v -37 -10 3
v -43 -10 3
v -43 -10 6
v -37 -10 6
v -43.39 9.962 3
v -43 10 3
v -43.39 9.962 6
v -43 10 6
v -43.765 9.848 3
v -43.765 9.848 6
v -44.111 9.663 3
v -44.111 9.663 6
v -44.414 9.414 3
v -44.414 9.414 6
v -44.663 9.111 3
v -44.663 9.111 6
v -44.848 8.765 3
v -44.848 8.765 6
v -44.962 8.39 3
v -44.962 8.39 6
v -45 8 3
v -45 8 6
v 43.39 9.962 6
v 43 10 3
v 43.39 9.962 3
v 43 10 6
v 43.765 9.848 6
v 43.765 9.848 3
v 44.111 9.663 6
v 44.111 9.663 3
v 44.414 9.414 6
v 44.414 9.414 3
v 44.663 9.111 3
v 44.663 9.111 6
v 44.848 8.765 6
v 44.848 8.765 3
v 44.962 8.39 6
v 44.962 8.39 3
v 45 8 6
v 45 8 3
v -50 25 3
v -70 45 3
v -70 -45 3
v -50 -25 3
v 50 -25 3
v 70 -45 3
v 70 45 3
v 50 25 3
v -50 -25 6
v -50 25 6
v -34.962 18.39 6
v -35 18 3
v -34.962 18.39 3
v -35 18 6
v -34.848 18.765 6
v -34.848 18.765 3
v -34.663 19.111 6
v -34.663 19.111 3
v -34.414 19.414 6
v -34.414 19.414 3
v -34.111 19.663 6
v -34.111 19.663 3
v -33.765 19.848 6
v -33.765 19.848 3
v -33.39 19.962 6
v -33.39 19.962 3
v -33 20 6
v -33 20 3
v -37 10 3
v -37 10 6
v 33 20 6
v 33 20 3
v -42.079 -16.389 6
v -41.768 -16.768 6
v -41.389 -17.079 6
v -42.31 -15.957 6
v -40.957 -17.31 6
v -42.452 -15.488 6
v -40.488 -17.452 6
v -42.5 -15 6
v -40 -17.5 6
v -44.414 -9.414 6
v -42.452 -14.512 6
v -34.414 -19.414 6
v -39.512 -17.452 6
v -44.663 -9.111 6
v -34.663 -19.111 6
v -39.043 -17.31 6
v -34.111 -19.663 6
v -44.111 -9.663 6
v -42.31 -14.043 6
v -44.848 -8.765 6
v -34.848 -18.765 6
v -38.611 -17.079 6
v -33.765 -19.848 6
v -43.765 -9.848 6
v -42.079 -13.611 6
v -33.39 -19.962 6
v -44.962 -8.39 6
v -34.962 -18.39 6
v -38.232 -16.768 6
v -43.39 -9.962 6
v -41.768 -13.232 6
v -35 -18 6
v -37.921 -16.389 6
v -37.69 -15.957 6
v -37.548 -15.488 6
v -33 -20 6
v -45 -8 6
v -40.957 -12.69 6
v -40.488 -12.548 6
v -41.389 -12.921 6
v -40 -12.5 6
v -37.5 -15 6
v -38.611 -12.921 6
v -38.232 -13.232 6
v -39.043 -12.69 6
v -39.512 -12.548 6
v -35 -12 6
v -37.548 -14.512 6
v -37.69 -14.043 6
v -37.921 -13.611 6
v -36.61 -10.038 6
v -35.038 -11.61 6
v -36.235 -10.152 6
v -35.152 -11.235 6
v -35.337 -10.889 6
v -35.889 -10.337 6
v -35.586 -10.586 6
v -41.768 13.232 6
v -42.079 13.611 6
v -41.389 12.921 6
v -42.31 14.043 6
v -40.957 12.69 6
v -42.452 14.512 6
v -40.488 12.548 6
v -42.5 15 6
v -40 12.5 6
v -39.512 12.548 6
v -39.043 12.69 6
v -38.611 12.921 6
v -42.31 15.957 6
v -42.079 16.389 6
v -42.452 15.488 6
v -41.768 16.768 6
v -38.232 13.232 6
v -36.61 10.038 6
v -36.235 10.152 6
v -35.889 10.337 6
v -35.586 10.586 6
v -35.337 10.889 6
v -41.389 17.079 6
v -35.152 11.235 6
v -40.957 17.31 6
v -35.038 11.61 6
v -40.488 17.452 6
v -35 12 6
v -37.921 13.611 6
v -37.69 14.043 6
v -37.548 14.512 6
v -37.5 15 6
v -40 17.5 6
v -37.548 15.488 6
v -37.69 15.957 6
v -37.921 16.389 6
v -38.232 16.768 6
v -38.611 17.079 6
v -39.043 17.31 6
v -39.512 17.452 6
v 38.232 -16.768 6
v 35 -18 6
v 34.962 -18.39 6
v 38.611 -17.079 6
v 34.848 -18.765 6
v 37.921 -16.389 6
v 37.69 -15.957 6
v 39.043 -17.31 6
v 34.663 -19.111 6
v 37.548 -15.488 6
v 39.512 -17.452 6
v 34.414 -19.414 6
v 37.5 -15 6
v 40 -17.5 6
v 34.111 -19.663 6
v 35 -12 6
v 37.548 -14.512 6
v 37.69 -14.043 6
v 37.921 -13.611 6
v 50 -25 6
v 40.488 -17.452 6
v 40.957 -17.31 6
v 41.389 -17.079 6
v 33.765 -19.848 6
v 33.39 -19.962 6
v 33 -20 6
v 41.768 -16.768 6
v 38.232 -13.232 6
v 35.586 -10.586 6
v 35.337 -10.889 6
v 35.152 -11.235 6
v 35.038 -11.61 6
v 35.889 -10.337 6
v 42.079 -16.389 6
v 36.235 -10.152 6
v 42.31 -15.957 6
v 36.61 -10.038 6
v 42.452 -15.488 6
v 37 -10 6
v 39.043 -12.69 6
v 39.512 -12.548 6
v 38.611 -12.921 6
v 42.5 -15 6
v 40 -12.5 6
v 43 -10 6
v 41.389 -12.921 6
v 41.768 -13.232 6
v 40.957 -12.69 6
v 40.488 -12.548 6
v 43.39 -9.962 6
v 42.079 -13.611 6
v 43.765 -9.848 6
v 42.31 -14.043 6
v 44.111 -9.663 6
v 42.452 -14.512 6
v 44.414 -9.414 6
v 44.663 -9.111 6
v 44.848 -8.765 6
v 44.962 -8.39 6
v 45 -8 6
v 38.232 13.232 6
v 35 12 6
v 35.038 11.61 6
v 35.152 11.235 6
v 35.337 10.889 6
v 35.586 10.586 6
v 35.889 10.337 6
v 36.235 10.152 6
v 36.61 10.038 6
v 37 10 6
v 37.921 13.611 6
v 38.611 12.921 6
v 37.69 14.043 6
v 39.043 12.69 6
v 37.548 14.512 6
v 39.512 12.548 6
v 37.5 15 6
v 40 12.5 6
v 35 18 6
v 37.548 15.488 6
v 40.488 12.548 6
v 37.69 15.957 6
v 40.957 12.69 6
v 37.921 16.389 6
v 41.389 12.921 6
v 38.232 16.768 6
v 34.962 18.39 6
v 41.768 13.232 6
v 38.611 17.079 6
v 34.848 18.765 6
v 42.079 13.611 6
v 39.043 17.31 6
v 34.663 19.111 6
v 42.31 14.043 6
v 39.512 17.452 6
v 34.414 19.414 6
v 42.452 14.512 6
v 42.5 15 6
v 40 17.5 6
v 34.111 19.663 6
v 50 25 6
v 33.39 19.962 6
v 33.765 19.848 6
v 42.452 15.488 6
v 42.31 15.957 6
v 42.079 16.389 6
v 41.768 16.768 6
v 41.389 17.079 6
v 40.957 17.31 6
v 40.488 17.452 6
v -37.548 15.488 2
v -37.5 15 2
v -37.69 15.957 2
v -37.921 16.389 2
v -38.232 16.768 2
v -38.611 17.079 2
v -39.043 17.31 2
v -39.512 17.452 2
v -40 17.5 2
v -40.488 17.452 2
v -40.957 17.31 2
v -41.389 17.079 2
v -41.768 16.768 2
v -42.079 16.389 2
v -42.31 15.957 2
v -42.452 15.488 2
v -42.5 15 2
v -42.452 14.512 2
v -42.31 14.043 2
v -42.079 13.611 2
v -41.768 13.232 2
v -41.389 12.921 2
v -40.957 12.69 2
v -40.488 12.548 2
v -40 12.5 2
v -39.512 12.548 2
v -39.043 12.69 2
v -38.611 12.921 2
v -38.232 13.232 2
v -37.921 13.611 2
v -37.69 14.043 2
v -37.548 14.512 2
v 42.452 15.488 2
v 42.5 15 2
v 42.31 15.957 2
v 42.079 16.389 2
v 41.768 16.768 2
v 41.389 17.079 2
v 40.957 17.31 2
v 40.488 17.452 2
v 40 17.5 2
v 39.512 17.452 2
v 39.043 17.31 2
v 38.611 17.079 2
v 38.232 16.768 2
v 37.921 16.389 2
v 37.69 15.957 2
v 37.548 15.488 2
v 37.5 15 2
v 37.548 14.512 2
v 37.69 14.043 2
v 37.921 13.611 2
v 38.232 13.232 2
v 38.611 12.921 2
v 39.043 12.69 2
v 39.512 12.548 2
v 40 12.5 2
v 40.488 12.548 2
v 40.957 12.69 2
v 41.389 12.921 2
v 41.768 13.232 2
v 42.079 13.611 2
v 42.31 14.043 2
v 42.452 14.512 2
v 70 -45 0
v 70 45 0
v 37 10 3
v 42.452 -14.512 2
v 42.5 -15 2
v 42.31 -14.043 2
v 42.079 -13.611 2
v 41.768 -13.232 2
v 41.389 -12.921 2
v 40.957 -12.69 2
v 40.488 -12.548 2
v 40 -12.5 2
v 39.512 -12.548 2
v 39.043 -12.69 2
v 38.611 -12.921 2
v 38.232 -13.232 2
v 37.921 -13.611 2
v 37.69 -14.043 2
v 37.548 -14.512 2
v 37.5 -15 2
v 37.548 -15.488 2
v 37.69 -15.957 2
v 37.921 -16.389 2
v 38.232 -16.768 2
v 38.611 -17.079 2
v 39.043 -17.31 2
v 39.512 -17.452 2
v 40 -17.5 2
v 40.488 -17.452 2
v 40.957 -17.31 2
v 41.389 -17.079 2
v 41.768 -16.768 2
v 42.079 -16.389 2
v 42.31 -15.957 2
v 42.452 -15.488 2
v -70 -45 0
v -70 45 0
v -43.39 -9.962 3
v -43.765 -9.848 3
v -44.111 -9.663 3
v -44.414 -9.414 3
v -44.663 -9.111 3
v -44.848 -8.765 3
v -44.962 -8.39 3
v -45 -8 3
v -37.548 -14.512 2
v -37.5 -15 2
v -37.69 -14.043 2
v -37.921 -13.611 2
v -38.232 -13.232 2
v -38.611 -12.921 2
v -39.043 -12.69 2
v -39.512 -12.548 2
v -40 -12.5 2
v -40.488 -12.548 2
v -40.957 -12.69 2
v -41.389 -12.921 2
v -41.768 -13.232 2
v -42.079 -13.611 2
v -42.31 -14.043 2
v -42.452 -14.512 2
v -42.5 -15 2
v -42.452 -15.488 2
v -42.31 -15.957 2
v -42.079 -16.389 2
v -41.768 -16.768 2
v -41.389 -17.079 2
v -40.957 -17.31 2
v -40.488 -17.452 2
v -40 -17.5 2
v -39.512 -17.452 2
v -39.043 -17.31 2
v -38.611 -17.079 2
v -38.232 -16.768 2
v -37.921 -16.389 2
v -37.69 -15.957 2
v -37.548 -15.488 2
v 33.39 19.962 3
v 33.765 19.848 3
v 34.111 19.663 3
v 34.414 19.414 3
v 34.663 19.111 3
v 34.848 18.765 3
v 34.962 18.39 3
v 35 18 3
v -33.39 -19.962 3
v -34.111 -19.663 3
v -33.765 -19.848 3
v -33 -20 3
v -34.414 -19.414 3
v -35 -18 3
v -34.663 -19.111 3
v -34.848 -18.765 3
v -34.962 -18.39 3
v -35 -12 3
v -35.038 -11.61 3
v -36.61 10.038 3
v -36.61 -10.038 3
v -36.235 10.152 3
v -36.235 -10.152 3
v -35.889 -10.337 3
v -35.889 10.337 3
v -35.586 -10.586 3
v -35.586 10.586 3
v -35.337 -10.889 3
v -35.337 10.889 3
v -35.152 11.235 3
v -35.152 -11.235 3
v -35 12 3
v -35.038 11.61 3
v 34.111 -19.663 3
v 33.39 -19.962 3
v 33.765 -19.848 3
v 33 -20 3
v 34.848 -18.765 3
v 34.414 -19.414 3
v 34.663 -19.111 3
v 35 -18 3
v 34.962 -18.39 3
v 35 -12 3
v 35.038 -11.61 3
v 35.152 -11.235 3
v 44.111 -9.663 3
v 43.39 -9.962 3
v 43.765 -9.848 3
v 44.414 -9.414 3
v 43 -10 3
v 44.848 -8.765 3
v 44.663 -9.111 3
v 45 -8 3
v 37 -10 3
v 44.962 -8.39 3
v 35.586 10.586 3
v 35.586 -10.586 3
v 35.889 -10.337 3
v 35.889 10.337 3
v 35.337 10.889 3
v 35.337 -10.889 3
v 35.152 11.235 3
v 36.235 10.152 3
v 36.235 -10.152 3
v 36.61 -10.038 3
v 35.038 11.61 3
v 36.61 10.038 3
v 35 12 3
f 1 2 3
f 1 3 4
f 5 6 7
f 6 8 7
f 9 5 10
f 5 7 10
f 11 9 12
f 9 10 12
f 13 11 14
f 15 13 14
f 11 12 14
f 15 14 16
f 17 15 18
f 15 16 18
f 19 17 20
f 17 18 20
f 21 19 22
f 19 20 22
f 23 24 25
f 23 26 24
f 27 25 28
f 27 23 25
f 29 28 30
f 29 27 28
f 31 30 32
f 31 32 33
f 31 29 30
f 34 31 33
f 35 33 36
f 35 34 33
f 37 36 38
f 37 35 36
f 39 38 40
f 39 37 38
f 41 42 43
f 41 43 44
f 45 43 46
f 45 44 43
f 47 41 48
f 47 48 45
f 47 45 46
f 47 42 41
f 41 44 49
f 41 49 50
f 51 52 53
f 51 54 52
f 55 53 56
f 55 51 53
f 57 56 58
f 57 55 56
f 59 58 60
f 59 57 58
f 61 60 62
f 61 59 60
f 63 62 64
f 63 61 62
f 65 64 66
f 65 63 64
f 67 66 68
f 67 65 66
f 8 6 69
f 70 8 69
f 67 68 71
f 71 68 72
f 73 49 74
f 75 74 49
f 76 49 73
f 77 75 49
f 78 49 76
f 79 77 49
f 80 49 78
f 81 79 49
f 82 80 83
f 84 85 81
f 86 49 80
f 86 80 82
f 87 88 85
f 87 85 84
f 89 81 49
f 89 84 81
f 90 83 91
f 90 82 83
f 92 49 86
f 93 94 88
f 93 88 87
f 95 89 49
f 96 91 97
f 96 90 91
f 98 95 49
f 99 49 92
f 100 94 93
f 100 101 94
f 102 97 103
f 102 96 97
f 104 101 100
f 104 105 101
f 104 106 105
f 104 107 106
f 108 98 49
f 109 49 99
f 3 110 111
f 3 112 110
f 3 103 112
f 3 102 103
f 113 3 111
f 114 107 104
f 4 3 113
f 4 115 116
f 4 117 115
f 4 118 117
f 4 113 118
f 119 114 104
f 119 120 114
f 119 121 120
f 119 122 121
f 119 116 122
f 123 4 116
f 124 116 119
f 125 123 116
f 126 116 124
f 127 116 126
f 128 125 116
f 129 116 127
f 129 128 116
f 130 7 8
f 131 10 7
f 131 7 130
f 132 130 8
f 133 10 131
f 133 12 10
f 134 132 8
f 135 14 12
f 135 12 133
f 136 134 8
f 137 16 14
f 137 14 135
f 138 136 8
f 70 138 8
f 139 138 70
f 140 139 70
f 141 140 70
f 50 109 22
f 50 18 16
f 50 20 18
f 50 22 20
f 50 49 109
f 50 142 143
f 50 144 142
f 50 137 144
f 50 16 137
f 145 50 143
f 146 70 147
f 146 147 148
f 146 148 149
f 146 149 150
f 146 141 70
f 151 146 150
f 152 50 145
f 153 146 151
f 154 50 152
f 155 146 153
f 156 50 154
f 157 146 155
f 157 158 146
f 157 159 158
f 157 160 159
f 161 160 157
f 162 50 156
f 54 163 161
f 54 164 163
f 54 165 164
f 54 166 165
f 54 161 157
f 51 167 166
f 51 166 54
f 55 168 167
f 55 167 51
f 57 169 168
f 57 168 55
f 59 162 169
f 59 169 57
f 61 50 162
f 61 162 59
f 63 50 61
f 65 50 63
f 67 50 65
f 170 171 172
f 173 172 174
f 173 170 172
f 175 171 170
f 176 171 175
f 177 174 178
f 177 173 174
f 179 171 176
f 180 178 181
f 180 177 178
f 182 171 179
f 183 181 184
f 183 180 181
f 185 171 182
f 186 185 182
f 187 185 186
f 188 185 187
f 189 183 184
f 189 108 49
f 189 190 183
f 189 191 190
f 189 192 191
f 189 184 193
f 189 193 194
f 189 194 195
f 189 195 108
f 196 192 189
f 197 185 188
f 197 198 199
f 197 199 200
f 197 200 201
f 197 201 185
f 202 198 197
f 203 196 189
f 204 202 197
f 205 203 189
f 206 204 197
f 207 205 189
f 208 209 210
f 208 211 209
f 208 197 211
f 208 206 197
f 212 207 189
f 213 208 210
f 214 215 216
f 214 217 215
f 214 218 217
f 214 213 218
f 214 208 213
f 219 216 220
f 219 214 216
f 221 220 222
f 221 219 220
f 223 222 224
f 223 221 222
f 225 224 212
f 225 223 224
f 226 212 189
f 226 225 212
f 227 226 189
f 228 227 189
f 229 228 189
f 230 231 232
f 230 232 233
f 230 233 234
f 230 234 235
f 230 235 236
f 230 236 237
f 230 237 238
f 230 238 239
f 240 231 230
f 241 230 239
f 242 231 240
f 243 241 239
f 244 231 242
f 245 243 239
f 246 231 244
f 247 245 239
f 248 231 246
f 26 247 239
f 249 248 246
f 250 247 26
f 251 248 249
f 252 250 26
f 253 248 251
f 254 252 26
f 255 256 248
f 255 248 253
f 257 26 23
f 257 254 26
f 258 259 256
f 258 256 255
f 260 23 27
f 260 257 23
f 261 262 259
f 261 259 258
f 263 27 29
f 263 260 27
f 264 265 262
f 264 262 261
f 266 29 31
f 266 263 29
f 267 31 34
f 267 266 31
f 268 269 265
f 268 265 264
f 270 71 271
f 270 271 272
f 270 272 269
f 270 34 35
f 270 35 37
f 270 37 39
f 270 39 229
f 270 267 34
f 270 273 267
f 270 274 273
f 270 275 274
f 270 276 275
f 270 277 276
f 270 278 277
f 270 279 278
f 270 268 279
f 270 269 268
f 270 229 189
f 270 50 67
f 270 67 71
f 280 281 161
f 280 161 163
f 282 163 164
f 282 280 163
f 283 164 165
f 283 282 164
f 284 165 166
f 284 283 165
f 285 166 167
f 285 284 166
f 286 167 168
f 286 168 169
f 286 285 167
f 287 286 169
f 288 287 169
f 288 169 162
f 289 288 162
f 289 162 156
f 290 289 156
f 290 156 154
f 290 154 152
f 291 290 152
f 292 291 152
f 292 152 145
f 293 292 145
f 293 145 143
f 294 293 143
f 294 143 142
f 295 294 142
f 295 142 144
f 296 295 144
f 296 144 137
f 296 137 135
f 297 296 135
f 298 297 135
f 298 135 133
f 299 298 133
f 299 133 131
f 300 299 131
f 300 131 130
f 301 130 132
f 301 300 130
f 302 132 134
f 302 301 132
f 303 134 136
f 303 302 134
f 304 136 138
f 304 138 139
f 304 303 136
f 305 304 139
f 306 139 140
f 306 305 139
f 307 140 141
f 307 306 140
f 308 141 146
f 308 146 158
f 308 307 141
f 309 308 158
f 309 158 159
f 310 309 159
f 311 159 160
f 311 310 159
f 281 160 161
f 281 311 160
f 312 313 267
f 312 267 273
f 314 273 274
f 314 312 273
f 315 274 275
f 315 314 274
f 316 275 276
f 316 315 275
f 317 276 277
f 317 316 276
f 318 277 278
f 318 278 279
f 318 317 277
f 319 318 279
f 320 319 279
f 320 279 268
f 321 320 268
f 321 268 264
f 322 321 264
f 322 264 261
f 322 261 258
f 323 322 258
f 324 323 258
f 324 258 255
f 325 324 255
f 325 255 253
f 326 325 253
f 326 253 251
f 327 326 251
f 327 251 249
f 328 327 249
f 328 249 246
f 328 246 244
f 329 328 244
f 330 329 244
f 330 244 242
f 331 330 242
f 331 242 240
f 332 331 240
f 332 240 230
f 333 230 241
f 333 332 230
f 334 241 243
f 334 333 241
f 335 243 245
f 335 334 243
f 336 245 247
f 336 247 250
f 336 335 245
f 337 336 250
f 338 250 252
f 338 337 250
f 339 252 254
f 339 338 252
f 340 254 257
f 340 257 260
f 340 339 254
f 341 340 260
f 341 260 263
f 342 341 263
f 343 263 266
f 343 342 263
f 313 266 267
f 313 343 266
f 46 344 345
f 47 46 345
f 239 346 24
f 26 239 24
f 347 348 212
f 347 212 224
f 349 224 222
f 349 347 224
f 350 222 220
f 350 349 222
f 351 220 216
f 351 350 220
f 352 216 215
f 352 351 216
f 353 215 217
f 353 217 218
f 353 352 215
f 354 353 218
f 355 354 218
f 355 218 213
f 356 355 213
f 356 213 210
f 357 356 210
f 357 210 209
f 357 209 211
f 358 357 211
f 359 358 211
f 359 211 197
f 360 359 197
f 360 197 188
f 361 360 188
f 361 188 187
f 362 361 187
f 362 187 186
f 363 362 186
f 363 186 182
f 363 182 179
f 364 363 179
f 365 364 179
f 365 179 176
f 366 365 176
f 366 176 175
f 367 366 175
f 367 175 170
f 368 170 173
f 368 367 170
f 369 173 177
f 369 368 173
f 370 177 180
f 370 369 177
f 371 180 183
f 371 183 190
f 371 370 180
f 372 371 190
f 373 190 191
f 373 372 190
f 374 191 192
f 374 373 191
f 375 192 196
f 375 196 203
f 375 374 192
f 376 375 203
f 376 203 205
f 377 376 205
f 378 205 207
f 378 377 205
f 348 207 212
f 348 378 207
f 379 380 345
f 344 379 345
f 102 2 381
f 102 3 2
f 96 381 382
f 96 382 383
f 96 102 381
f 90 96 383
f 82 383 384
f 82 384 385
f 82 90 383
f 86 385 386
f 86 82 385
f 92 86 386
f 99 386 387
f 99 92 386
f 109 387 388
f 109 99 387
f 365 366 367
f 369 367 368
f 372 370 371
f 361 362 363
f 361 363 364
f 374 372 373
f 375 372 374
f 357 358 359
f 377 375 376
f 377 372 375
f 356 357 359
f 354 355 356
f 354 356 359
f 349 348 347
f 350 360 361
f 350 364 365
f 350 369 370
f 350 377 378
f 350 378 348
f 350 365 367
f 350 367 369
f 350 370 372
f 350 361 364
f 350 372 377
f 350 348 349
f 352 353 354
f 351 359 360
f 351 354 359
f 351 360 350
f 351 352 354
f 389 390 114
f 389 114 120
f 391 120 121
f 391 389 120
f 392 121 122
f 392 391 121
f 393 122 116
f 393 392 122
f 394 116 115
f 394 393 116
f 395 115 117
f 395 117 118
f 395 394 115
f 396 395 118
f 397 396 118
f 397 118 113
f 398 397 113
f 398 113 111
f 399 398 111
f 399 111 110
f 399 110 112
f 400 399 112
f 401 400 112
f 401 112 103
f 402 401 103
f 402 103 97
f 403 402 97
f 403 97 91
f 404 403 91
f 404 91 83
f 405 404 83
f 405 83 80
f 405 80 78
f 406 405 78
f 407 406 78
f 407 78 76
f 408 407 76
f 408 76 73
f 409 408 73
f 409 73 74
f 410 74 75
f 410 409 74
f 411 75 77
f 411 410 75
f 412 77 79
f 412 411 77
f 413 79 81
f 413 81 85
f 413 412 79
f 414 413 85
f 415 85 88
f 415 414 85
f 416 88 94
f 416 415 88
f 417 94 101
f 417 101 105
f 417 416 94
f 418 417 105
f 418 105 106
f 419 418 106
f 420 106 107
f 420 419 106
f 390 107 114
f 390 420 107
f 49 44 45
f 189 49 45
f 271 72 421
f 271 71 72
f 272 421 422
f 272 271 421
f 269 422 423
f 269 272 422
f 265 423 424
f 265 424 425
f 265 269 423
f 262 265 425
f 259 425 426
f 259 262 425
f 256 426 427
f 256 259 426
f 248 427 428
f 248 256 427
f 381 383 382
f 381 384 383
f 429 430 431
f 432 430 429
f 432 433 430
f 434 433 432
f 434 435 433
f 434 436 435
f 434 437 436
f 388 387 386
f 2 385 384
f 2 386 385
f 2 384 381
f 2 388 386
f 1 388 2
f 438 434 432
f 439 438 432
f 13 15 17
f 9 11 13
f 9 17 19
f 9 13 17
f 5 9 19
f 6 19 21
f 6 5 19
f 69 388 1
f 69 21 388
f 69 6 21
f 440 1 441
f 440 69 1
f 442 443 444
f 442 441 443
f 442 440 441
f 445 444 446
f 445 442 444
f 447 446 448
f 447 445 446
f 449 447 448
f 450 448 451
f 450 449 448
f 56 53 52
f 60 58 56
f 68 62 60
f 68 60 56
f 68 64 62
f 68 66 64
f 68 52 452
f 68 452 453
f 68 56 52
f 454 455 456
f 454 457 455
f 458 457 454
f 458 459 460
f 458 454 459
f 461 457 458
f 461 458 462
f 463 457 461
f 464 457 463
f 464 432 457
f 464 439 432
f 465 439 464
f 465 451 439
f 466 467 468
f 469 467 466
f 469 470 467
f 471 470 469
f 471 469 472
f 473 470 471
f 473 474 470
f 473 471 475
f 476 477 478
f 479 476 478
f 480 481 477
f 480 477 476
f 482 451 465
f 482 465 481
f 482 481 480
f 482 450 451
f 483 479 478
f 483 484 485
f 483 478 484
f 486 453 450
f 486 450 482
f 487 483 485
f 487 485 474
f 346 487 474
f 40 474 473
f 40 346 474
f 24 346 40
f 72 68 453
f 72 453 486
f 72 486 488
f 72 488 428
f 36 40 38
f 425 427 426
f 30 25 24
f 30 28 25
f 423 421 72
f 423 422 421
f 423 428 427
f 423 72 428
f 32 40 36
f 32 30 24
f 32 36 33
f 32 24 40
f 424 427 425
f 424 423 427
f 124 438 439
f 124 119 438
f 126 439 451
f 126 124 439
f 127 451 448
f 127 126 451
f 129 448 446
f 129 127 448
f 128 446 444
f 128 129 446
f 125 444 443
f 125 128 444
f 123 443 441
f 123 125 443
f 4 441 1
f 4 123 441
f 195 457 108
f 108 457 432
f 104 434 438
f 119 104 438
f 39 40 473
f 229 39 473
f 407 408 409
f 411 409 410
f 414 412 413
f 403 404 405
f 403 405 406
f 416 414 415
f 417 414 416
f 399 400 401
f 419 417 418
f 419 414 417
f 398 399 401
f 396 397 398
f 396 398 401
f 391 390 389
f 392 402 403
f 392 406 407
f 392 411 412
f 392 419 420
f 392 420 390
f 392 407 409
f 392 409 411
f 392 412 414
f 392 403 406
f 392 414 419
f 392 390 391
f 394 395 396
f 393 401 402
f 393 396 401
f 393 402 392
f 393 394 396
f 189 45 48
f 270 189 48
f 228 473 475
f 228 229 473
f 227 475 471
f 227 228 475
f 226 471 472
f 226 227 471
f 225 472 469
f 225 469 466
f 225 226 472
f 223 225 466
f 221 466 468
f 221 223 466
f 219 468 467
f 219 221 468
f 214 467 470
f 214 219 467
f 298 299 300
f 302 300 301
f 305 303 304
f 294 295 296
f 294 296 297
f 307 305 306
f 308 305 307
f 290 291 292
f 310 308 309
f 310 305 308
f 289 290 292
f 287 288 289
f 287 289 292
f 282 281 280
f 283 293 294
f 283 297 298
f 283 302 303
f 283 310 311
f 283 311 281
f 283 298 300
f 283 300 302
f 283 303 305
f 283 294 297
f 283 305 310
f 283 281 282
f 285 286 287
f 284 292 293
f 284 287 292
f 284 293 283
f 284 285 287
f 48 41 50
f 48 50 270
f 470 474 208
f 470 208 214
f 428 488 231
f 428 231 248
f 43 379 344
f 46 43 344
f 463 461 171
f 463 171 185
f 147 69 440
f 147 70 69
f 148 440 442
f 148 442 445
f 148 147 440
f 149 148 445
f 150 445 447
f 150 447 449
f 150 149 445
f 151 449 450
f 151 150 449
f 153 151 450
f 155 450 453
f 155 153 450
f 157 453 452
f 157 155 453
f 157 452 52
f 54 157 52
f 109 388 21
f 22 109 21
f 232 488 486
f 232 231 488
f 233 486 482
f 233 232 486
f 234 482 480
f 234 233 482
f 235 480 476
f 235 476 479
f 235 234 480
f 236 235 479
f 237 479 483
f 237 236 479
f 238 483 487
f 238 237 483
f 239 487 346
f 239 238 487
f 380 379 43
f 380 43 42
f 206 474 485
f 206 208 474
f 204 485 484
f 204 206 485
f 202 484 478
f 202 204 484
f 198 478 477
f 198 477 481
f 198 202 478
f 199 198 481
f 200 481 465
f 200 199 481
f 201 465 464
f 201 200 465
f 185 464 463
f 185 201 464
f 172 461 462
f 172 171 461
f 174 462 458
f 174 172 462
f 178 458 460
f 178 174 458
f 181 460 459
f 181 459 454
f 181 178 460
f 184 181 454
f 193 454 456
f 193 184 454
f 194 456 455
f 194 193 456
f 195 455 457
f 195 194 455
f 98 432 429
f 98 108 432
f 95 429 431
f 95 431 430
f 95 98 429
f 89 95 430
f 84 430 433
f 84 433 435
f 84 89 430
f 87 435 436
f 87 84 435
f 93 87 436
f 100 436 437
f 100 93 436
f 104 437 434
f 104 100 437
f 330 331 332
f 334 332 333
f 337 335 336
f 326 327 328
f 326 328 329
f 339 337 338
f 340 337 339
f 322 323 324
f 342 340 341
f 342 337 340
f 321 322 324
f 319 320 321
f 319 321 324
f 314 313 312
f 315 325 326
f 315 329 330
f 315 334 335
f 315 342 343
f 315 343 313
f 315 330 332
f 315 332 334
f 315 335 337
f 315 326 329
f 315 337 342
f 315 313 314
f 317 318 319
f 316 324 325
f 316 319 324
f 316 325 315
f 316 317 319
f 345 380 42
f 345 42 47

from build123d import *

# Parameters (mm, degrees)
F0_W     = 100
F0_H     = 50
F1_DEPTH = 6
F0_W_2   = 140
F0_H_2   = 90
F2_DEPTH = 3
F3_DEPTH = 3
F0_W_3   = 10
F0_H_3   = 10
F0_R     = 2.5
F4_DEPTH = 6
F5_DEPTH = 2
F6_R     = 2


with BuildPart() as f1:
    # F0 (on Top) → F1 (new body)
    with BuildSketch(Plane.XY):
        Rectangle(F0_W, F0_H)
        Polygon((-45, 10), (-45, 20), (-35, 20), (35, 20), (45, 20), (45, 10), (45, -10), (45, -20), (35, -20), (-35, -20), (-45, -20), (-45, -10), align=None, mode=Mode.SUBTRACT)
    extrude(amount=F1_DEPTH)

    # F0 (on Top) → F2 (join)
    with BuildSketch(Plane.XY):
        Rectangle(F0_W_2, F0_H_2)
        Rectangle(F0_W, F0_H, mode=Mode.SUBTRACT)
    extrude(amount=F2_DEPTH)

    # F0 (on Top) → F3 (join)
    with BuildSketch(Plane.XY):
        Rectangle(F0_W_2, F0_H_2)
        Rectangle(F0_W, F0_H, mode=Mode.SUBTRACT)
        Polygon((35, 20), (-35, 20), (-35, 10), (-45, 10), (-45, -10), (-35, -10), (-35, -20), (35, -20), (35, -10), (45, -10), (45, 10), (35, 10), align=None)
    extrude(amount=F3_DEPTH)

    # F0 (on Top) → F4 (join)
    with BuildSketch(Plane.XY):
        with Locations((-40, 15)):
            Rectangle(F0_W_3, F0_H_3)
        with Locations((-40, 15)):
            Circle(F0_R, mode=Mode.SUBTRACT)
        with Locations((40, 15)):
            Rectangle(F0_W_3, F0_H_3)
        with Locations((40, 15)):
            Circle(F0_R, mode=Mode.SUBTRACT)
        with Locations((40, -15)):
            Rectangle(F0_W_3, F0_H_3)
        with Locations((40, -15)):
            Circle(F0_R, mode=Mode.SUBTRACT)
        with Locations((-40, -15)):
            Rectangle(F0_W_3, F0_H_3)
        with Locations((-40, -15)):
            Circle(F0_R, mode=Mode.SUBTRACT)
    extrude(amount=F4_DEPTH)

    # F0 (on Top) → F5 (join)
    with BuildSketch(Plane.XY):
        with Locations((40, 15)):
            Circle(F0_R)
        with Locations((-40, 15)):
            Circle(F0_R)
        with Locations((40, -15)):
            Circle(F0_R)
        with Locations((-40, -15)):
            Circle(F0_R)
    extrude(amount=F5_DEPTH)

    # F6
    f6_edges = [f1.edges().sort_by_distance(p)[0] for p in [
        (-35, 10, 4.5),
        (35, 10, 4.5),
        (35, 20, 4.5),
        (45, 10, 4.5),
        (-35, 20, 4.5),
        (-45, 10, 4.5),
        (45, -10, 4.5),
        (35, -10, 4.5),
        (35, -20, 4.5),
        (-45, -10, 4.5),
        (-35, -10, 4.5),
        (-35, -20, 4.5),
    ]]
    fillet(f6_edges, radius=F6_R)


solid = f1.part
